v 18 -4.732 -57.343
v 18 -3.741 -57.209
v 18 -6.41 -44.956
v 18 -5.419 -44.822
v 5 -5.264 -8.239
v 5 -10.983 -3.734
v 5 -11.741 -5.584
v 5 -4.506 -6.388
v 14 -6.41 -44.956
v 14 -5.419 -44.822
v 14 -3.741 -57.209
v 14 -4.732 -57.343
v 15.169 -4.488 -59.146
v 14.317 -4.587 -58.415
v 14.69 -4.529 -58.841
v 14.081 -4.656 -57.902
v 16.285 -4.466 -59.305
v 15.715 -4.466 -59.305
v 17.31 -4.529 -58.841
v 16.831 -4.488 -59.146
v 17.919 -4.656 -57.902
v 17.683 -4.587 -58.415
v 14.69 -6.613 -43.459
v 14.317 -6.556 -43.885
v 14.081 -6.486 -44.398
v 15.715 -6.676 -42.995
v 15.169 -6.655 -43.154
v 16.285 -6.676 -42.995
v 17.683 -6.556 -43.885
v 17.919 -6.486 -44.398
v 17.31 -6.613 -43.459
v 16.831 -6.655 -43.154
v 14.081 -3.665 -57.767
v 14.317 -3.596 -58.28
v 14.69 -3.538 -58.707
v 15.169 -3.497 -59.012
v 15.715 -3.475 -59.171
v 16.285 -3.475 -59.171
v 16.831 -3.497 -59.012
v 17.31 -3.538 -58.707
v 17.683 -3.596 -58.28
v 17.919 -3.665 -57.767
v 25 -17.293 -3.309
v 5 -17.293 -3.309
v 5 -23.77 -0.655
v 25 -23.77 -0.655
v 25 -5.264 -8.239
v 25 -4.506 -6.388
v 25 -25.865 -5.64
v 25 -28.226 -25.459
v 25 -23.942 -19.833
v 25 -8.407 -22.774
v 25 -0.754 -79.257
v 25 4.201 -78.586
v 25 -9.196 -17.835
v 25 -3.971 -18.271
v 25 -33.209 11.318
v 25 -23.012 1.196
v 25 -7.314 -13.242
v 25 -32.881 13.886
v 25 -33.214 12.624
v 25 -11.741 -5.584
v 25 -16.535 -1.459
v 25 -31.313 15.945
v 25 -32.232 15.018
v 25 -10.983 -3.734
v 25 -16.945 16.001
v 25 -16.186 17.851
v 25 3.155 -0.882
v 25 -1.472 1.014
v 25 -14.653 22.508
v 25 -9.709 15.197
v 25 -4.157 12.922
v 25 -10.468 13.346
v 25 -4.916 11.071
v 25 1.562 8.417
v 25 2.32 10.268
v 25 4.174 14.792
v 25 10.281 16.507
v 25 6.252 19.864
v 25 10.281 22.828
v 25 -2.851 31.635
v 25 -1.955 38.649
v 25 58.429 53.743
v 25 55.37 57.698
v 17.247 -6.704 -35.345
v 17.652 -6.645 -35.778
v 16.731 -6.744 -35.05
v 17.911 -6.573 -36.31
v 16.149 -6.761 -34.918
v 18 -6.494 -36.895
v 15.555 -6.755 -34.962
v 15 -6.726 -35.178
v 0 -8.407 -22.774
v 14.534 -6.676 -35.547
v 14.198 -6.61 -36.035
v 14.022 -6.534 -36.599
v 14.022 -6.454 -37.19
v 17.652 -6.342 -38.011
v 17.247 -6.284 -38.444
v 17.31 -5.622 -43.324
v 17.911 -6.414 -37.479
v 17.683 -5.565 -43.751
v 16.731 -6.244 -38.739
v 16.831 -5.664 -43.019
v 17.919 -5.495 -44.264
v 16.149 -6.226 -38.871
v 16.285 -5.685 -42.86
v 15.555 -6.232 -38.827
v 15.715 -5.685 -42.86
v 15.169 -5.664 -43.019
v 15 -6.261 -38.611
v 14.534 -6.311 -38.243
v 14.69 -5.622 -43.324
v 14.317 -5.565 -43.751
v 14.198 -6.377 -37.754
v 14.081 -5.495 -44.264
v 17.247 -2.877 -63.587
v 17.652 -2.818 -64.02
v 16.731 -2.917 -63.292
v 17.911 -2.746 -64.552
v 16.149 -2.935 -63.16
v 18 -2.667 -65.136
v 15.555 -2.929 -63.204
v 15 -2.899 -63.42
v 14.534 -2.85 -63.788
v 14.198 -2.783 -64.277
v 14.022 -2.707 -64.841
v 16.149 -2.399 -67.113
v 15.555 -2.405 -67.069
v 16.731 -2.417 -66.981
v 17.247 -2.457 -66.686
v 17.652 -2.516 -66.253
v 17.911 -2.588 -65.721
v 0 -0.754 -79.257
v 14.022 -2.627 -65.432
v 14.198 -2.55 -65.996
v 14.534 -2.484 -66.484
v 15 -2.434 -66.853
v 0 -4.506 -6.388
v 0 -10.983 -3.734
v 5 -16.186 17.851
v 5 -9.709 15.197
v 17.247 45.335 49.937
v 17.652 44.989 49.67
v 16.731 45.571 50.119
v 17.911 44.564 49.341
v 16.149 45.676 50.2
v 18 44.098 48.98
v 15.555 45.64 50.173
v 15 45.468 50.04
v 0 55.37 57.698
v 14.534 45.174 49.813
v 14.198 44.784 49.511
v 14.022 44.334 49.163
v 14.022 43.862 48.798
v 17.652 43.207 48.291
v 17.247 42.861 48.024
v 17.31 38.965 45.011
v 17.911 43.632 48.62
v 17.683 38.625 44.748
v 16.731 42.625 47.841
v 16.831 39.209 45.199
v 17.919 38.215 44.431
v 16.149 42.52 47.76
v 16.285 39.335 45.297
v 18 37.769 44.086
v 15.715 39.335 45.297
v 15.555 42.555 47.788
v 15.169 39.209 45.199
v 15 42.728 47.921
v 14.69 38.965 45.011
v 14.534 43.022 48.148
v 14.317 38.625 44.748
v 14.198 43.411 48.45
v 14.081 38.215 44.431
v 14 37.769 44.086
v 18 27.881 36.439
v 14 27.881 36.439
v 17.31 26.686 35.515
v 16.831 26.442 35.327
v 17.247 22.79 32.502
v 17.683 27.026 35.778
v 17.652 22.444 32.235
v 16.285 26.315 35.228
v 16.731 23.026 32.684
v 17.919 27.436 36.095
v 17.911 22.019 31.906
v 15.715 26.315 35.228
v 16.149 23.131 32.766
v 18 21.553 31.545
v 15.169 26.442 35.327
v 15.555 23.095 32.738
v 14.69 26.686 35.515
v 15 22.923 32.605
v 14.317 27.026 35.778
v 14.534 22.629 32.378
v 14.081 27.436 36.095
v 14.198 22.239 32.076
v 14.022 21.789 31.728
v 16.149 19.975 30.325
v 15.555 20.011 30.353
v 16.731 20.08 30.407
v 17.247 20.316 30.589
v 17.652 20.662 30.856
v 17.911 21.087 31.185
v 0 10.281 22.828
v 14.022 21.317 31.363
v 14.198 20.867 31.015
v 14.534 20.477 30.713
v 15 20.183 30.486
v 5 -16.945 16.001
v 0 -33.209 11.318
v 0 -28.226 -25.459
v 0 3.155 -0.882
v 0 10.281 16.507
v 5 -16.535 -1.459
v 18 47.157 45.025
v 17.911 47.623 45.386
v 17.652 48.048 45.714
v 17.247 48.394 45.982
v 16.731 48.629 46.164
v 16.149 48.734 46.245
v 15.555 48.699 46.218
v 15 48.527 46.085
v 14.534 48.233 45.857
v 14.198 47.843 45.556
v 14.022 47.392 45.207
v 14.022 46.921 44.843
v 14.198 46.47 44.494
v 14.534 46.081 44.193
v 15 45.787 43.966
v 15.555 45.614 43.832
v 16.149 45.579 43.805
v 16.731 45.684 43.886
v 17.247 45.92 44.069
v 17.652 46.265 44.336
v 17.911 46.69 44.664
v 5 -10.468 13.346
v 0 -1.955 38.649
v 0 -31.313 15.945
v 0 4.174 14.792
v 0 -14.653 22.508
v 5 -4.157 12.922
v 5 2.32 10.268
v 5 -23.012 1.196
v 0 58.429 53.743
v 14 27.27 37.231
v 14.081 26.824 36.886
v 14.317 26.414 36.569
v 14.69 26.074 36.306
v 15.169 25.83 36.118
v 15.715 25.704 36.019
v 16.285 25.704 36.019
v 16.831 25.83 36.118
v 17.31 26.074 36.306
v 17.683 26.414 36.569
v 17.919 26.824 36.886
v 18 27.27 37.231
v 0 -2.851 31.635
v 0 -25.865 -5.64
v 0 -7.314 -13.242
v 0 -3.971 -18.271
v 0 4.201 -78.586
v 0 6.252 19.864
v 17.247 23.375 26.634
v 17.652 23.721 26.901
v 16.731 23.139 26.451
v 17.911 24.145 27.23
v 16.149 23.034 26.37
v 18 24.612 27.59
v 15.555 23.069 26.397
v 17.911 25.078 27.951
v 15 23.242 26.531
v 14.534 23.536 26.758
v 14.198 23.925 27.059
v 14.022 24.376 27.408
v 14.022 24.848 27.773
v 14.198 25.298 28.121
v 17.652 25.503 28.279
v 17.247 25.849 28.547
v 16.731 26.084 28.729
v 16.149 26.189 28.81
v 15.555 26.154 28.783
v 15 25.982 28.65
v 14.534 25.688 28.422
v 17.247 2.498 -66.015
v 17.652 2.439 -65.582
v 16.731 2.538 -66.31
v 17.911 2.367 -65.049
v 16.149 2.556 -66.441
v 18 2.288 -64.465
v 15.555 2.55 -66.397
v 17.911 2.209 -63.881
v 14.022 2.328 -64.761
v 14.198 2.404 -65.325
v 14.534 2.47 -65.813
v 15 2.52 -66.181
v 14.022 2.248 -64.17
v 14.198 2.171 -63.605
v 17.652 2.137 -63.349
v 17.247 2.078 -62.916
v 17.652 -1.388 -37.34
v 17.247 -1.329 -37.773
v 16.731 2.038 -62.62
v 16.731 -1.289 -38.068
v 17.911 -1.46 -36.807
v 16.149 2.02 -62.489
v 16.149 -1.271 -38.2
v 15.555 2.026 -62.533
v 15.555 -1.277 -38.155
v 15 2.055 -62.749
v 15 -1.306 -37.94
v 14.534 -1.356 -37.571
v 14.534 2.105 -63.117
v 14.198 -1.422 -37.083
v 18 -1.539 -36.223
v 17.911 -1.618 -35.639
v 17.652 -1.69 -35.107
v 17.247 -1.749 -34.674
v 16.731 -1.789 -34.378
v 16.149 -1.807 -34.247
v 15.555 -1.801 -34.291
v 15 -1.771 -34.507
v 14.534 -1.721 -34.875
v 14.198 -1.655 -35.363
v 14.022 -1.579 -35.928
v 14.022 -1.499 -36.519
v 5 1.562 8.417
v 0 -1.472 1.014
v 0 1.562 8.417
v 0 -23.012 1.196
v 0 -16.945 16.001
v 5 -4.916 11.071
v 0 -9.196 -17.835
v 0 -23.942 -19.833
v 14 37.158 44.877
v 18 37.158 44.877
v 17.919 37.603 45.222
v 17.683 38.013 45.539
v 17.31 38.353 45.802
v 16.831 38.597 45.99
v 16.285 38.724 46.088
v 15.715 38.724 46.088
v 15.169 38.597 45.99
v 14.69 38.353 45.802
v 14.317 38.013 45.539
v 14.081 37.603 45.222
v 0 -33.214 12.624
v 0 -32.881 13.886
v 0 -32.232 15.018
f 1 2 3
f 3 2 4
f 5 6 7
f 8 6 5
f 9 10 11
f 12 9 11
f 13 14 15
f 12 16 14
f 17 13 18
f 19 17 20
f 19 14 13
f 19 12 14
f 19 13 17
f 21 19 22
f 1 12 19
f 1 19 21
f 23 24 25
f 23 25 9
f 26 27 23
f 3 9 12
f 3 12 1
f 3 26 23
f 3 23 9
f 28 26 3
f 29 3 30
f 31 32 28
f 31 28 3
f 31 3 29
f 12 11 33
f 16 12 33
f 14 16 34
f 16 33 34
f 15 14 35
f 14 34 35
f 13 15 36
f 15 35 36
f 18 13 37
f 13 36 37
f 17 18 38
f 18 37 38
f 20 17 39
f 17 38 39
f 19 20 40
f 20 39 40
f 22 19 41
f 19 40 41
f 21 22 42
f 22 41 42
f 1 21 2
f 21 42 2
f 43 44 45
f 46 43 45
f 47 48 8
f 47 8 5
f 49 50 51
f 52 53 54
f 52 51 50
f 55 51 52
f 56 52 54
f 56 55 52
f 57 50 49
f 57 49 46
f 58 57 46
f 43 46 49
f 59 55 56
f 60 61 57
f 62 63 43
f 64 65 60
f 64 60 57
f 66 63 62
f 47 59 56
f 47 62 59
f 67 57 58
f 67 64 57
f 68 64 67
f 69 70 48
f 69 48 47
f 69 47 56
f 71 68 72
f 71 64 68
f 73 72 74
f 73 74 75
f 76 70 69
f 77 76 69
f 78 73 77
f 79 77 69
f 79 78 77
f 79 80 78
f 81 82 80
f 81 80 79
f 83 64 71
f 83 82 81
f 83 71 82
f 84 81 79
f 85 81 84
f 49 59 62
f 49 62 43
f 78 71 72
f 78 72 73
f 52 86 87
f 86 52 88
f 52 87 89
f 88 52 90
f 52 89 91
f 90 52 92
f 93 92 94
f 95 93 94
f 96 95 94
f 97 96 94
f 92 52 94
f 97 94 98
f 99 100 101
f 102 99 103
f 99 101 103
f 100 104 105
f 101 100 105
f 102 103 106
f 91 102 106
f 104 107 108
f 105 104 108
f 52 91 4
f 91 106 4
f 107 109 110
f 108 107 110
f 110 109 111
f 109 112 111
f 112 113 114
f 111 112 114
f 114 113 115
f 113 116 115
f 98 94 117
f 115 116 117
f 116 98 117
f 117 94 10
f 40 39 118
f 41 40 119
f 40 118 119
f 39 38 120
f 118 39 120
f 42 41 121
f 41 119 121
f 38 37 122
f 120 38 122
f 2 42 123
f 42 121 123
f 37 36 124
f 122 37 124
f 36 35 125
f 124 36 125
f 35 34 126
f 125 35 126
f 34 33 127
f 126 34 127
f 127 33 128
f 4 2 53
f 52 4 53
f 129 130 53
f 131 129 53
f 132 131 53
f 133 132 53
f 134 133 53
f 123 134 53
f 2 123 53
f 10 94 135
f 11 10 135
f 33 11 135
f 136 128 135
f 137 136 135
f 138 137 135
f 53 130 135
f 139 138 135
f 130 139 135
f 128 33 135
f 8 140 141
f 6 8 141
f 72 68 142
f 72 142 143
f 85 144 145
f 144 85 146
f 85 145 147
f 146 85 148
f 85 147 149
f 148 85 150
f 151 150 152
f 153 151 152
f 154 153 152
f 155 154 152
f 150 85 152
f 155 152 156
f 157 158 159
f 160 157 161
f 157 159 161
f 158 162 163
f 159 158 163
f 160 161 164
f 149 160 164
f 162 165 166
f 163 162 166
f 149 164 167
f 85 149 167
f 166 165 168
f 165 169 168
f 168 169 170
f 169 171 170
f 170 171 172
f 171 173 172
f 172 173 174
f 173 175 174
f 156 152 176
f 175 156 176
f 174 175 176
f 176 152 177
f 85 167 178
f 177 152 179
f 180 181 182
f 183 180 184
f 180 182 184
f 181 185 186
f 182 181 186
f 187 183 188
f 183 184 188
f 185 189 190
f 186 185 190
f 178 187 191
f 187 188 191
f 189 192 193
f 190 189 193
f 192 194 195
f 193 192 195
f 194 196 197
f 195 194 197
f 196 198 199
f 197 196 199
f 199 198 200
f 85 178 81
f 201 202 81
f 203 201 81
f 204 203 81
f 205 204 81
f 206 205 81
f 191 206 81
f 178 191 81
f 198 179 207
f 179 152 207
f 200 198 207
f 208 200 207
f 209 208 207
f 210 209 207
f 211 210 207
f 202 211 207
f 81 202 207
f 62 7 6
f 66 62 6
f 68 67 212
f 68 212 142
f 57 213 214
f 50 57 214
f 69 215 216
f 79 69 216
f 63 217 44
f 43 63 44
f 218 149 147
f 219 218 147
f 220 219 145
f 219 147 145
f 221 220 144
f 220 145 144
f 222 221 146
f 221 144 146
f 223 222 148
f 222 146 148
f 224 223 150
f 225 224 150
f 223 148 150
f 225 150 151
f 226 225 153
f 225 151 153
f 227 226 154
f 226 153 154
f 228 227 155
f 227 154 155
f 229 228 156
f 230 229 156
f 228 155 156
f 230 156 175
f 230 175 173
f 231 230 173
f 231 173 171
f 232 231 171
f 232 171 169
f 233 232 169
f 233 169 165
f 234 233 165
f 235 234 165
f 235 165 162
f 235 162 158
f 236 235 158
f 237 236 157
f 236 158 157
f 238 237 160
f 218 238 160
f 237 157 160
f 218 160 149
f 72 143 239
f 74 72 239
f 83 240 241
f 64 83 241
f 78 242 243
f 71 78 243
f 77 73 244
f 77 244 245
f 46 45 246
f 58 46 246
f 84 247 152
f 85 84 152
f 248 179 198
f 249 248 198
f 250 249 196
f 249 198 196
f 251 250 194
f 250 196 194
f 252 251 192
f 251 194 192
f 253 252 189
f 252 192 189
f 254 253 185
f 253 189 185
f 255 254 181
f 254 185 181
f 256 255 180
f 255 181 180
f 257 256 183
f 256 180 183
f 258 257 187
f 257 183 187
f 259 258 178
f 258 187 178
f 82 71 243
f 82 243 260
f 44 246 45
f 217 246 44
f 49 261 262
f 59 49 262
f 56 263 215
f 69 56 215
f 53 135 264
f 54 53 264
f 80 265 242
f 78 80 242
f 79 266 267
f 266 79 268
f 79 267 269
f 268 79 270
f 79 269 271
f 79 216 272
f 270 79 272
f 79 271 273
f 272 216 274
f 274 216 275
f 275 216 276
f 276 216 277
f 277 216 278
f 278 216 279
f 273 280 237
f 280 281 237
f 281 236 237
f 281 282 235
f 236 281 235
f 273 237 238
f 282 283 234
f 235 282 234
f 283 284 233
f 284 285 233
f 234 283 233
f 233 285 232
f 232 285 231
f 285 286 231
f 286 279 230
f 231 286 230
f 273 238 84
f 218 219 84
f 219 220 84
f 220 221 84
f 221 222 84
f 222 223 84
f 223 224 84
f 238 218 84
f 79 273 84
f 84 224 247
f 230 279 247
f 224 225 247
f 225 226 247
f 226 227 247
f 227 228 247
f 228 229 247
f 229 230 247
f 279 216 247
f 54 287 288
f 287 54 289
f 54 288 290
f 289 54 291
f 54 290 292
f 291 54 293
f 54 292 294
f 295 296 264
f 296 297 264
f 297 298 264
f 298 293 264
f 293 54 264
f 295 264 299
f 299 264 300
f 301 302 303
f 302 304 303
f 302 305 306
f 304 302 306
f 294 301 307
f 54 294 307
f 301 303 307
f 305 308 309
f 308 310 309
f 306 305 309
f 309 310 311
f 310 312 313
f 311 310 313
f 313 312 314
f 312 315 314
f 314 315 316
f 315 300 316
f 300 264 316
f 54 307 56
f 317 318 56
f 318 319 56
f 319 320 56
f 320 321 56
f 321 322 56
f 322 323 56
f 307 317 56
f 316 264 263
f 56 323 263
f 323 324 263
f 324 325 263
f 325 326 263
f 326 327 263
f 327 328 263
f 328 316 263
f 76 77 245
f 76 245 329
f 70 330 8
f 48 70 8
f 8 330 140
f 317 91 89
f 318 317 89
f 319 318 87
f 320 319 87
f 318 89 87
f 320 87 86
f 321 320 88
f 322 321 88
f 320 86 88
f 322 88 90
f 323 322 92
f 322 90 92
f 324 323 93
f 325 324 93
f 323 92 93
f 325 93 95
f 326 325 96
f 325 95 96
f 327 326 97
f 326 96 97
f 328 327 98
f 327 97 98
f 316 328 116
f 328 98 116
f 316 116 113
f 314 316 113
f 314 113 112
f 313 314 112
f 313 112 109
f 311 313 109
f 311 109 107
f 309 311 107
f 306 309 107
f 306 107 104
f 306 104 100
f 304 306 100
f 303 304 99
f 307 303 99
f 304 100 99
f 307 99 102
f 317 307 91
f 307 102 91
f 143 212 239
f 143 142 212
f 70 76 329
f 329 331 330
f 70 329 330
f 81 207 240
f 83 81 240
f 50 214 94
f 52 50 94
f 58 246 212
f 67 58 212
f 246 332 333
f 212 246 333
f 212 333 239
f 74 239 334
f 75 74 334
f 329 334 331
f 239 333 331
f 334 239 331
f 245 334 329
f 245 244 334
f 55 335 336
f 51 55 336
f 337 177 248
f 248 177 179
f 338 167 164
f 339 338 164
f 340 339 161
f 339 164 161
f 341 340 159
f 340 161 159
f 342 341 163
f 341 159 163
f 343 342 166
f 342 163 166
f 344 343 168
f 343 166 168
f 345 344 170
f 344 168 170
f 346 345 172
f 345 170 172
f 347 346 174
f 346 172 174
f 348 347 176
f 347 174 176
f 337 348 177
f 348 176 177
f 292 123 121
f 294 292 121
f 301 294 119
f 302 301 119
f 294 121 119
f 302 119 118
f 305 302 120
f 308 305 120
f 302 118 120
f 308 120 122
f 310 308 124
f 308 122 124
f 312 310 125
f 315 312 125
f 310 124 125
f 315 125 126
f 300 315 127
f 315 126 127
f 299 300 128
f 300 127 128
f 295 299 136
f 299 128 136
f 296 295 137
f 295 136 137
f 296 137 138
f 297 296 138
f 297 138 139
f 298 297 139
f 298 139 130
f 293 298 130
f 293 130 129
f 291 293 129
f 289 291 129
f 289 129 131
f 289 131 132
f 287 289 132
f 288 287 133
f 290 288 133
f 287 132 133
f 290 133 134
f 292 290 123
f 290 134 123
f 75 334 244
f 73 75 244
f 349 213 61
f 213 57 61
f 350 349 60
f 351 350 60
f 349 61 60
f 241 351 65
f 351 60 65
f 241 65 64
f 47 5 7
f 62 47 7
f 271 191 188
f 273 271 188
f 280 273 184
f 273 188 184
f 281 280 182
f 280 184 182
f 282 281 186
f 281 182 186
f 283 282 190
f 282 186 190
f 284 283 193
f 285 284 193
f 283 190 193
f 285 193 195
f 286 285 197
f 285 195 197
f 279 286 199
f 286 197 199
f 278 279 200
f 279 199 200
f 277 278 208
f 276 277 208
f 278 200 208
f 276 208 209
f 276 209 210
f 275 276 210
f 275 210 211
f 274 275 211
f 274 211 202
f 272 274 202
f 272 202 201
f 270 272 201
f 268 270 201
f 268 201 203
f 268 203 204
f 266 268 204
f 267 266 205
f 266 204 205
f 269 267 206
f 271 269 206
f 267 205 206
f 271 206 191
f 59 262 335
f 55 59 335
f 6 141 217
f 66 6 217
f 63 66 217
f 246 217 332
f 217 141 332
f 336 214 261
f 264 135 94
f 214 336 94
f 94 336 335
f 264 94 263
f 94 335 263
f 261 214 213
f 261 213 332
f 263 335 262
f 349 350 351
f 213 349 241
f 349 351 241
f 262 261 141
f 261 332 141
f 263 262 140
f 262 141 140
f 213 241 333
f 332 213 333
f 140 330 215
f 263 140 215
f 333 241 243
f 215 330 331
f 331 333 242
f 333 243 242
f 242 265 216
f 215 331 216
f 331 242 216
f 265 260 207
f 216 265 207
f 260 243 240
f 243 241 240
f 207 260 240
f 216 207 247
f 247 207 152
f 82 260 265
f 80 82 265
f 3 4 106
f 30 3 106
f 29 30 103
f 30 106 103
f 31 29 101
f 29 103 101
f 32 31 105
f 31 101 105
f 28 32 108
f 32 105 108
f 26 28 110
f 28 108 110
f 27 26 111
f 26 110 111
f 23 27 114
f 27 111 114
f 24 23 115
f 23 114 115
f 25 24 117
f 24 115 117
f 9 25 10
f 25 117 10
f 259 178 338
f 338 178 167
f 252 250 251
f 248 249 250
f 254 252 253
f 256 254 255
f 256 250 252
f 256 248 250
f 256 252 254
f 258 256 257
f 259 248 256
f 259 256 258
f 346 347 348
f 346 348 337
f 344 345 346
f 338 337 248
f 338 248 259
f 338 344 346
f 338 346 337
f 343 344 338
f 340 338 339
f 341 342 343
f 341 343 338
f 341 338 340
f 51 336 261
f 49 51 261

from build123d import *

# Parameters (mm, degrees)
F1_DEPTH = 25
F2_DEPTH = 5
F3_R     = 5
F5_DEPTH = 1
F6_DEPTH = 5
F8_DEPTH = 1
F9_DEPTH = 5


with BuildPart() as f1:
    # F0 (on Right) → F1 (new body)
    with BuildSketch(Plane.YZ):
        Polygon((-1.9545168432, 38.6489601963), (-33.5964987424, 14.1788767986), (-28.2257758369, -25.4589250511), (-8.406874912, -22.7735635983), (-0.7535947717, -79.2574312341), (4.2011304595, -78.5860908709), (-3.9713255886, -18.2705245759), (3.1545996335, -0.8816359607), (10.2805248557, 16.5072526545), (58.4291094867, 53.742590351), (55.370349062, 57.6978380884), (10.2805248557, 22.8279692467), align=None)
        Polygon((-25.8654488138, -5.6400241263), (-7.3142972833, -13.2422419285), (-9.1963342424, -17.8348428934), (-23.9423909688, -19.8328594567), align=None, mode=Mode.SUBTRACT)
        Polygon((1.5615552233, 8.4168698067), (-1.4719884671, 1.0143288458), (-4.5055321574, -6.3882121151), (-5.26391808, -8.2388473554), (-11.7411414209, -5.5844966263), (-17.2930471416, -3.3093388585), (-23.7702704824, -0.6549881294), (-23.0118845598, 1.1956471108), (-16.944797179, 16.0007290327), (-16.1864112564, 17.851364273), (-9.7091879156, 15.1970135439), (-4.1572821949, 12.9218557761), (2.3199411459, 10.267505047), align=None, mode=Mode.SUBTRACT)
        Polygon((-14.6534166938, 22.50764705), (-2.8510041559, 31.6349520341), (6.2523573083, 19.863500585), (4.1741345282, 14.7921613112), align=None, mode=Mode.SUBTRACT)
        Polygon((-11.7411414209, -5.5844966263), (-10.9827554983, -3.7338613861), (-16.534661219, -1.4587036183), (-17.2930471416, -3.3093388585), align=None)
        Polygon((-10.4675738382, 13.3463783036), (-4.9156681175, 11.0712205358), (-4.1572821949, 12.9218557761), (-9.7091879156, 15.1970135439), align=None)
    extrude(amount=F1_DEPTH)

    # F0 (on Right) → F2 (join)
    with BuildSketch(Plane.YZ):
        Polygon((-5.26391808, -8.2388473554), (-4.5055321574, -6.3882121151), (-10.9827554983, -3.7338613861), (-11.7411414209, -5.5844966263), align=None)
        Polygon((-17.2930471416, -3.3093388585), (-16.534661219, -1.4587036183), (-23.0118845598, 1.1956471108), (-23.7702704824, -0.6549881294), align=None)
        Polygon((-16.944797179, 16.0007290327), (-10.4675738382, 13.3463783036), (-9.7091879156, 15.1970135439), (-16.1864112564, 17.851364273), align=None)
        Polygon((-4.9156681175, 11.0712205358), (1.5615552233, 8.4168698067), (2.3199411459, 10.267505047), (-4.1572821949, 12.9218557761), align=None)
    extrude(amount=F2_DEPTH)

    # F3
    f3_edges = [f1.edges().sort_by_distance(p)[0] for p in [
        (12.5, -33.596499, 14.178877),
    ]]
    fillet(f3_edges, radius=F3_R)

    # F4 (on face) → F5 (join)
    with BuildSketch(Plane(origin=(0, -7.1996627103, 9.3098006026), x_dir=(1, 0, 0), z_dir=(0, -0.6117520849, 0.7910495475))):
        with BuildLine():
            ThreePointArc((14, 56.8474623166), (16, 54.8474623166), (18, 56.8474623166))
            ThreePointArc((18, 56.8474623166), (16, 58.8474623166), (14, 56.8474623166))
        make_face()
        with BuildLine():
            ThreePointArc((14, 44.3474623166), (16, 42.3474623166), (18, 44.3474623166))
            ThreePointArc((18, 44.3474623166), (16, 46.3474623166), (14, 44.3474623166))
        make_face()
        with BuildLine():
            Line((18, 44.3474623166), (18, 56.8474623166))
            ThreePointArc((18, 56.8474623166), (16, 54.8474623166), (14, 56.8474623166))
            Line((14, 56.8474623166), (14, 44.3474623166))
            ThreePointArc((14, 44.3474623166), (16, 46.3474623166), (18, 44.3474623166))
        make_face()
    extrude(amount=F5_DEPTH)

    # F4 (on face) → F6 (cut)
    with BuildSketch(Plane(origin=(0, -7.1996627103, 9.3098006026), x_dir=(1, 0, 0), z_dir=(0, -0.6117520849, 0.7910495475))):
        with BuildLine():
            ThreePointArc((14, 64.8474623166), (16, 62.8474623166), (18, 64.8474623166))
            ThreePointArc((18, 64.8474623166), (16, 66.8474623166), (14, 64.8474623166))
        make_face()
        with BuildLine():
            ThreePointArc((14, 36.3474623166), (16, 34.3474623166), (18, 36.3474623166))
            ThreePointArc((18, 36.3474623166), (16, 38.3474623166), (14, 36.3474623166))
        make_face()
    extrude(amount=-F6_DEPTH, mode=Mode.SUBTRACT)

    # F7 (on face) → F8 (join)
    with BuildSketch(Plane(origin=(0, -11.2853910764, -1.5291137632), x_dir=(1, 0, 0), z_dir=(0, -0.9909450462, -0.1342680726))):
        with BuildLine():
            ThreePointArc((14, -43.6885751417), (16, -45.6885751417), (18, -43.6885751417))
            ThreePointArc((18, -43.6885751417), (16, -41.6885751417), (14, -43.6885751417))
        make_face()
        with BuildLine():
            Line((18, -56.1885751417), (18, -43.6885751417))
            ThreePointArc((18, -43.6885751417), (16, -45.6885751417), (14, -43.6885751417))
            Line((14, -43.6885751417), (14, -56.1885751417))
            ThreePointArc((14, -56.1885751417), (16, -54.1885751417), (18, -56.1885751417))
        make_face()
        with BuildLine():
            ThreePointArc((14, -56.1885751417), (16, -58.1885751417), (18, -56.1885751417))
            ThreePointArc((18, -56.1885751417), (16, -54.1885751417), (14, -56.1885751417))
        make_face()
    extrude(amount=F8_DEPTH)

    # F7 (on face) → F9 (cut)
    with BuildSketch(Plane(origin=(0, -11.2853910764, -1.5291137632), x_dir=(1, 0, 0), z_dir=(0, -0.9909450462, -0.1342680726))):
        with BuildLine():
            ThreePointArc((14, -35.6885751417), (16, -37.6885751417), (18, -35.6885751417))
            ThreePointArc((18, -35.6885751417), (16, -33.6885751417), (14, -35.6885751417))
        make_face()
        with BuildLine():
            ThreePointArc((14, -64.1885751417), (16, -66.1885751417), (18, -64.1885751417))
            ThreePointArc((18, -64.1885751417), (16, -62.1885751417), (14, -64.1885751417))
        make_face()
    extrude(amount=-F9_DEPTH, mode=Mode.SUBTRACT)


solid = f1.part
